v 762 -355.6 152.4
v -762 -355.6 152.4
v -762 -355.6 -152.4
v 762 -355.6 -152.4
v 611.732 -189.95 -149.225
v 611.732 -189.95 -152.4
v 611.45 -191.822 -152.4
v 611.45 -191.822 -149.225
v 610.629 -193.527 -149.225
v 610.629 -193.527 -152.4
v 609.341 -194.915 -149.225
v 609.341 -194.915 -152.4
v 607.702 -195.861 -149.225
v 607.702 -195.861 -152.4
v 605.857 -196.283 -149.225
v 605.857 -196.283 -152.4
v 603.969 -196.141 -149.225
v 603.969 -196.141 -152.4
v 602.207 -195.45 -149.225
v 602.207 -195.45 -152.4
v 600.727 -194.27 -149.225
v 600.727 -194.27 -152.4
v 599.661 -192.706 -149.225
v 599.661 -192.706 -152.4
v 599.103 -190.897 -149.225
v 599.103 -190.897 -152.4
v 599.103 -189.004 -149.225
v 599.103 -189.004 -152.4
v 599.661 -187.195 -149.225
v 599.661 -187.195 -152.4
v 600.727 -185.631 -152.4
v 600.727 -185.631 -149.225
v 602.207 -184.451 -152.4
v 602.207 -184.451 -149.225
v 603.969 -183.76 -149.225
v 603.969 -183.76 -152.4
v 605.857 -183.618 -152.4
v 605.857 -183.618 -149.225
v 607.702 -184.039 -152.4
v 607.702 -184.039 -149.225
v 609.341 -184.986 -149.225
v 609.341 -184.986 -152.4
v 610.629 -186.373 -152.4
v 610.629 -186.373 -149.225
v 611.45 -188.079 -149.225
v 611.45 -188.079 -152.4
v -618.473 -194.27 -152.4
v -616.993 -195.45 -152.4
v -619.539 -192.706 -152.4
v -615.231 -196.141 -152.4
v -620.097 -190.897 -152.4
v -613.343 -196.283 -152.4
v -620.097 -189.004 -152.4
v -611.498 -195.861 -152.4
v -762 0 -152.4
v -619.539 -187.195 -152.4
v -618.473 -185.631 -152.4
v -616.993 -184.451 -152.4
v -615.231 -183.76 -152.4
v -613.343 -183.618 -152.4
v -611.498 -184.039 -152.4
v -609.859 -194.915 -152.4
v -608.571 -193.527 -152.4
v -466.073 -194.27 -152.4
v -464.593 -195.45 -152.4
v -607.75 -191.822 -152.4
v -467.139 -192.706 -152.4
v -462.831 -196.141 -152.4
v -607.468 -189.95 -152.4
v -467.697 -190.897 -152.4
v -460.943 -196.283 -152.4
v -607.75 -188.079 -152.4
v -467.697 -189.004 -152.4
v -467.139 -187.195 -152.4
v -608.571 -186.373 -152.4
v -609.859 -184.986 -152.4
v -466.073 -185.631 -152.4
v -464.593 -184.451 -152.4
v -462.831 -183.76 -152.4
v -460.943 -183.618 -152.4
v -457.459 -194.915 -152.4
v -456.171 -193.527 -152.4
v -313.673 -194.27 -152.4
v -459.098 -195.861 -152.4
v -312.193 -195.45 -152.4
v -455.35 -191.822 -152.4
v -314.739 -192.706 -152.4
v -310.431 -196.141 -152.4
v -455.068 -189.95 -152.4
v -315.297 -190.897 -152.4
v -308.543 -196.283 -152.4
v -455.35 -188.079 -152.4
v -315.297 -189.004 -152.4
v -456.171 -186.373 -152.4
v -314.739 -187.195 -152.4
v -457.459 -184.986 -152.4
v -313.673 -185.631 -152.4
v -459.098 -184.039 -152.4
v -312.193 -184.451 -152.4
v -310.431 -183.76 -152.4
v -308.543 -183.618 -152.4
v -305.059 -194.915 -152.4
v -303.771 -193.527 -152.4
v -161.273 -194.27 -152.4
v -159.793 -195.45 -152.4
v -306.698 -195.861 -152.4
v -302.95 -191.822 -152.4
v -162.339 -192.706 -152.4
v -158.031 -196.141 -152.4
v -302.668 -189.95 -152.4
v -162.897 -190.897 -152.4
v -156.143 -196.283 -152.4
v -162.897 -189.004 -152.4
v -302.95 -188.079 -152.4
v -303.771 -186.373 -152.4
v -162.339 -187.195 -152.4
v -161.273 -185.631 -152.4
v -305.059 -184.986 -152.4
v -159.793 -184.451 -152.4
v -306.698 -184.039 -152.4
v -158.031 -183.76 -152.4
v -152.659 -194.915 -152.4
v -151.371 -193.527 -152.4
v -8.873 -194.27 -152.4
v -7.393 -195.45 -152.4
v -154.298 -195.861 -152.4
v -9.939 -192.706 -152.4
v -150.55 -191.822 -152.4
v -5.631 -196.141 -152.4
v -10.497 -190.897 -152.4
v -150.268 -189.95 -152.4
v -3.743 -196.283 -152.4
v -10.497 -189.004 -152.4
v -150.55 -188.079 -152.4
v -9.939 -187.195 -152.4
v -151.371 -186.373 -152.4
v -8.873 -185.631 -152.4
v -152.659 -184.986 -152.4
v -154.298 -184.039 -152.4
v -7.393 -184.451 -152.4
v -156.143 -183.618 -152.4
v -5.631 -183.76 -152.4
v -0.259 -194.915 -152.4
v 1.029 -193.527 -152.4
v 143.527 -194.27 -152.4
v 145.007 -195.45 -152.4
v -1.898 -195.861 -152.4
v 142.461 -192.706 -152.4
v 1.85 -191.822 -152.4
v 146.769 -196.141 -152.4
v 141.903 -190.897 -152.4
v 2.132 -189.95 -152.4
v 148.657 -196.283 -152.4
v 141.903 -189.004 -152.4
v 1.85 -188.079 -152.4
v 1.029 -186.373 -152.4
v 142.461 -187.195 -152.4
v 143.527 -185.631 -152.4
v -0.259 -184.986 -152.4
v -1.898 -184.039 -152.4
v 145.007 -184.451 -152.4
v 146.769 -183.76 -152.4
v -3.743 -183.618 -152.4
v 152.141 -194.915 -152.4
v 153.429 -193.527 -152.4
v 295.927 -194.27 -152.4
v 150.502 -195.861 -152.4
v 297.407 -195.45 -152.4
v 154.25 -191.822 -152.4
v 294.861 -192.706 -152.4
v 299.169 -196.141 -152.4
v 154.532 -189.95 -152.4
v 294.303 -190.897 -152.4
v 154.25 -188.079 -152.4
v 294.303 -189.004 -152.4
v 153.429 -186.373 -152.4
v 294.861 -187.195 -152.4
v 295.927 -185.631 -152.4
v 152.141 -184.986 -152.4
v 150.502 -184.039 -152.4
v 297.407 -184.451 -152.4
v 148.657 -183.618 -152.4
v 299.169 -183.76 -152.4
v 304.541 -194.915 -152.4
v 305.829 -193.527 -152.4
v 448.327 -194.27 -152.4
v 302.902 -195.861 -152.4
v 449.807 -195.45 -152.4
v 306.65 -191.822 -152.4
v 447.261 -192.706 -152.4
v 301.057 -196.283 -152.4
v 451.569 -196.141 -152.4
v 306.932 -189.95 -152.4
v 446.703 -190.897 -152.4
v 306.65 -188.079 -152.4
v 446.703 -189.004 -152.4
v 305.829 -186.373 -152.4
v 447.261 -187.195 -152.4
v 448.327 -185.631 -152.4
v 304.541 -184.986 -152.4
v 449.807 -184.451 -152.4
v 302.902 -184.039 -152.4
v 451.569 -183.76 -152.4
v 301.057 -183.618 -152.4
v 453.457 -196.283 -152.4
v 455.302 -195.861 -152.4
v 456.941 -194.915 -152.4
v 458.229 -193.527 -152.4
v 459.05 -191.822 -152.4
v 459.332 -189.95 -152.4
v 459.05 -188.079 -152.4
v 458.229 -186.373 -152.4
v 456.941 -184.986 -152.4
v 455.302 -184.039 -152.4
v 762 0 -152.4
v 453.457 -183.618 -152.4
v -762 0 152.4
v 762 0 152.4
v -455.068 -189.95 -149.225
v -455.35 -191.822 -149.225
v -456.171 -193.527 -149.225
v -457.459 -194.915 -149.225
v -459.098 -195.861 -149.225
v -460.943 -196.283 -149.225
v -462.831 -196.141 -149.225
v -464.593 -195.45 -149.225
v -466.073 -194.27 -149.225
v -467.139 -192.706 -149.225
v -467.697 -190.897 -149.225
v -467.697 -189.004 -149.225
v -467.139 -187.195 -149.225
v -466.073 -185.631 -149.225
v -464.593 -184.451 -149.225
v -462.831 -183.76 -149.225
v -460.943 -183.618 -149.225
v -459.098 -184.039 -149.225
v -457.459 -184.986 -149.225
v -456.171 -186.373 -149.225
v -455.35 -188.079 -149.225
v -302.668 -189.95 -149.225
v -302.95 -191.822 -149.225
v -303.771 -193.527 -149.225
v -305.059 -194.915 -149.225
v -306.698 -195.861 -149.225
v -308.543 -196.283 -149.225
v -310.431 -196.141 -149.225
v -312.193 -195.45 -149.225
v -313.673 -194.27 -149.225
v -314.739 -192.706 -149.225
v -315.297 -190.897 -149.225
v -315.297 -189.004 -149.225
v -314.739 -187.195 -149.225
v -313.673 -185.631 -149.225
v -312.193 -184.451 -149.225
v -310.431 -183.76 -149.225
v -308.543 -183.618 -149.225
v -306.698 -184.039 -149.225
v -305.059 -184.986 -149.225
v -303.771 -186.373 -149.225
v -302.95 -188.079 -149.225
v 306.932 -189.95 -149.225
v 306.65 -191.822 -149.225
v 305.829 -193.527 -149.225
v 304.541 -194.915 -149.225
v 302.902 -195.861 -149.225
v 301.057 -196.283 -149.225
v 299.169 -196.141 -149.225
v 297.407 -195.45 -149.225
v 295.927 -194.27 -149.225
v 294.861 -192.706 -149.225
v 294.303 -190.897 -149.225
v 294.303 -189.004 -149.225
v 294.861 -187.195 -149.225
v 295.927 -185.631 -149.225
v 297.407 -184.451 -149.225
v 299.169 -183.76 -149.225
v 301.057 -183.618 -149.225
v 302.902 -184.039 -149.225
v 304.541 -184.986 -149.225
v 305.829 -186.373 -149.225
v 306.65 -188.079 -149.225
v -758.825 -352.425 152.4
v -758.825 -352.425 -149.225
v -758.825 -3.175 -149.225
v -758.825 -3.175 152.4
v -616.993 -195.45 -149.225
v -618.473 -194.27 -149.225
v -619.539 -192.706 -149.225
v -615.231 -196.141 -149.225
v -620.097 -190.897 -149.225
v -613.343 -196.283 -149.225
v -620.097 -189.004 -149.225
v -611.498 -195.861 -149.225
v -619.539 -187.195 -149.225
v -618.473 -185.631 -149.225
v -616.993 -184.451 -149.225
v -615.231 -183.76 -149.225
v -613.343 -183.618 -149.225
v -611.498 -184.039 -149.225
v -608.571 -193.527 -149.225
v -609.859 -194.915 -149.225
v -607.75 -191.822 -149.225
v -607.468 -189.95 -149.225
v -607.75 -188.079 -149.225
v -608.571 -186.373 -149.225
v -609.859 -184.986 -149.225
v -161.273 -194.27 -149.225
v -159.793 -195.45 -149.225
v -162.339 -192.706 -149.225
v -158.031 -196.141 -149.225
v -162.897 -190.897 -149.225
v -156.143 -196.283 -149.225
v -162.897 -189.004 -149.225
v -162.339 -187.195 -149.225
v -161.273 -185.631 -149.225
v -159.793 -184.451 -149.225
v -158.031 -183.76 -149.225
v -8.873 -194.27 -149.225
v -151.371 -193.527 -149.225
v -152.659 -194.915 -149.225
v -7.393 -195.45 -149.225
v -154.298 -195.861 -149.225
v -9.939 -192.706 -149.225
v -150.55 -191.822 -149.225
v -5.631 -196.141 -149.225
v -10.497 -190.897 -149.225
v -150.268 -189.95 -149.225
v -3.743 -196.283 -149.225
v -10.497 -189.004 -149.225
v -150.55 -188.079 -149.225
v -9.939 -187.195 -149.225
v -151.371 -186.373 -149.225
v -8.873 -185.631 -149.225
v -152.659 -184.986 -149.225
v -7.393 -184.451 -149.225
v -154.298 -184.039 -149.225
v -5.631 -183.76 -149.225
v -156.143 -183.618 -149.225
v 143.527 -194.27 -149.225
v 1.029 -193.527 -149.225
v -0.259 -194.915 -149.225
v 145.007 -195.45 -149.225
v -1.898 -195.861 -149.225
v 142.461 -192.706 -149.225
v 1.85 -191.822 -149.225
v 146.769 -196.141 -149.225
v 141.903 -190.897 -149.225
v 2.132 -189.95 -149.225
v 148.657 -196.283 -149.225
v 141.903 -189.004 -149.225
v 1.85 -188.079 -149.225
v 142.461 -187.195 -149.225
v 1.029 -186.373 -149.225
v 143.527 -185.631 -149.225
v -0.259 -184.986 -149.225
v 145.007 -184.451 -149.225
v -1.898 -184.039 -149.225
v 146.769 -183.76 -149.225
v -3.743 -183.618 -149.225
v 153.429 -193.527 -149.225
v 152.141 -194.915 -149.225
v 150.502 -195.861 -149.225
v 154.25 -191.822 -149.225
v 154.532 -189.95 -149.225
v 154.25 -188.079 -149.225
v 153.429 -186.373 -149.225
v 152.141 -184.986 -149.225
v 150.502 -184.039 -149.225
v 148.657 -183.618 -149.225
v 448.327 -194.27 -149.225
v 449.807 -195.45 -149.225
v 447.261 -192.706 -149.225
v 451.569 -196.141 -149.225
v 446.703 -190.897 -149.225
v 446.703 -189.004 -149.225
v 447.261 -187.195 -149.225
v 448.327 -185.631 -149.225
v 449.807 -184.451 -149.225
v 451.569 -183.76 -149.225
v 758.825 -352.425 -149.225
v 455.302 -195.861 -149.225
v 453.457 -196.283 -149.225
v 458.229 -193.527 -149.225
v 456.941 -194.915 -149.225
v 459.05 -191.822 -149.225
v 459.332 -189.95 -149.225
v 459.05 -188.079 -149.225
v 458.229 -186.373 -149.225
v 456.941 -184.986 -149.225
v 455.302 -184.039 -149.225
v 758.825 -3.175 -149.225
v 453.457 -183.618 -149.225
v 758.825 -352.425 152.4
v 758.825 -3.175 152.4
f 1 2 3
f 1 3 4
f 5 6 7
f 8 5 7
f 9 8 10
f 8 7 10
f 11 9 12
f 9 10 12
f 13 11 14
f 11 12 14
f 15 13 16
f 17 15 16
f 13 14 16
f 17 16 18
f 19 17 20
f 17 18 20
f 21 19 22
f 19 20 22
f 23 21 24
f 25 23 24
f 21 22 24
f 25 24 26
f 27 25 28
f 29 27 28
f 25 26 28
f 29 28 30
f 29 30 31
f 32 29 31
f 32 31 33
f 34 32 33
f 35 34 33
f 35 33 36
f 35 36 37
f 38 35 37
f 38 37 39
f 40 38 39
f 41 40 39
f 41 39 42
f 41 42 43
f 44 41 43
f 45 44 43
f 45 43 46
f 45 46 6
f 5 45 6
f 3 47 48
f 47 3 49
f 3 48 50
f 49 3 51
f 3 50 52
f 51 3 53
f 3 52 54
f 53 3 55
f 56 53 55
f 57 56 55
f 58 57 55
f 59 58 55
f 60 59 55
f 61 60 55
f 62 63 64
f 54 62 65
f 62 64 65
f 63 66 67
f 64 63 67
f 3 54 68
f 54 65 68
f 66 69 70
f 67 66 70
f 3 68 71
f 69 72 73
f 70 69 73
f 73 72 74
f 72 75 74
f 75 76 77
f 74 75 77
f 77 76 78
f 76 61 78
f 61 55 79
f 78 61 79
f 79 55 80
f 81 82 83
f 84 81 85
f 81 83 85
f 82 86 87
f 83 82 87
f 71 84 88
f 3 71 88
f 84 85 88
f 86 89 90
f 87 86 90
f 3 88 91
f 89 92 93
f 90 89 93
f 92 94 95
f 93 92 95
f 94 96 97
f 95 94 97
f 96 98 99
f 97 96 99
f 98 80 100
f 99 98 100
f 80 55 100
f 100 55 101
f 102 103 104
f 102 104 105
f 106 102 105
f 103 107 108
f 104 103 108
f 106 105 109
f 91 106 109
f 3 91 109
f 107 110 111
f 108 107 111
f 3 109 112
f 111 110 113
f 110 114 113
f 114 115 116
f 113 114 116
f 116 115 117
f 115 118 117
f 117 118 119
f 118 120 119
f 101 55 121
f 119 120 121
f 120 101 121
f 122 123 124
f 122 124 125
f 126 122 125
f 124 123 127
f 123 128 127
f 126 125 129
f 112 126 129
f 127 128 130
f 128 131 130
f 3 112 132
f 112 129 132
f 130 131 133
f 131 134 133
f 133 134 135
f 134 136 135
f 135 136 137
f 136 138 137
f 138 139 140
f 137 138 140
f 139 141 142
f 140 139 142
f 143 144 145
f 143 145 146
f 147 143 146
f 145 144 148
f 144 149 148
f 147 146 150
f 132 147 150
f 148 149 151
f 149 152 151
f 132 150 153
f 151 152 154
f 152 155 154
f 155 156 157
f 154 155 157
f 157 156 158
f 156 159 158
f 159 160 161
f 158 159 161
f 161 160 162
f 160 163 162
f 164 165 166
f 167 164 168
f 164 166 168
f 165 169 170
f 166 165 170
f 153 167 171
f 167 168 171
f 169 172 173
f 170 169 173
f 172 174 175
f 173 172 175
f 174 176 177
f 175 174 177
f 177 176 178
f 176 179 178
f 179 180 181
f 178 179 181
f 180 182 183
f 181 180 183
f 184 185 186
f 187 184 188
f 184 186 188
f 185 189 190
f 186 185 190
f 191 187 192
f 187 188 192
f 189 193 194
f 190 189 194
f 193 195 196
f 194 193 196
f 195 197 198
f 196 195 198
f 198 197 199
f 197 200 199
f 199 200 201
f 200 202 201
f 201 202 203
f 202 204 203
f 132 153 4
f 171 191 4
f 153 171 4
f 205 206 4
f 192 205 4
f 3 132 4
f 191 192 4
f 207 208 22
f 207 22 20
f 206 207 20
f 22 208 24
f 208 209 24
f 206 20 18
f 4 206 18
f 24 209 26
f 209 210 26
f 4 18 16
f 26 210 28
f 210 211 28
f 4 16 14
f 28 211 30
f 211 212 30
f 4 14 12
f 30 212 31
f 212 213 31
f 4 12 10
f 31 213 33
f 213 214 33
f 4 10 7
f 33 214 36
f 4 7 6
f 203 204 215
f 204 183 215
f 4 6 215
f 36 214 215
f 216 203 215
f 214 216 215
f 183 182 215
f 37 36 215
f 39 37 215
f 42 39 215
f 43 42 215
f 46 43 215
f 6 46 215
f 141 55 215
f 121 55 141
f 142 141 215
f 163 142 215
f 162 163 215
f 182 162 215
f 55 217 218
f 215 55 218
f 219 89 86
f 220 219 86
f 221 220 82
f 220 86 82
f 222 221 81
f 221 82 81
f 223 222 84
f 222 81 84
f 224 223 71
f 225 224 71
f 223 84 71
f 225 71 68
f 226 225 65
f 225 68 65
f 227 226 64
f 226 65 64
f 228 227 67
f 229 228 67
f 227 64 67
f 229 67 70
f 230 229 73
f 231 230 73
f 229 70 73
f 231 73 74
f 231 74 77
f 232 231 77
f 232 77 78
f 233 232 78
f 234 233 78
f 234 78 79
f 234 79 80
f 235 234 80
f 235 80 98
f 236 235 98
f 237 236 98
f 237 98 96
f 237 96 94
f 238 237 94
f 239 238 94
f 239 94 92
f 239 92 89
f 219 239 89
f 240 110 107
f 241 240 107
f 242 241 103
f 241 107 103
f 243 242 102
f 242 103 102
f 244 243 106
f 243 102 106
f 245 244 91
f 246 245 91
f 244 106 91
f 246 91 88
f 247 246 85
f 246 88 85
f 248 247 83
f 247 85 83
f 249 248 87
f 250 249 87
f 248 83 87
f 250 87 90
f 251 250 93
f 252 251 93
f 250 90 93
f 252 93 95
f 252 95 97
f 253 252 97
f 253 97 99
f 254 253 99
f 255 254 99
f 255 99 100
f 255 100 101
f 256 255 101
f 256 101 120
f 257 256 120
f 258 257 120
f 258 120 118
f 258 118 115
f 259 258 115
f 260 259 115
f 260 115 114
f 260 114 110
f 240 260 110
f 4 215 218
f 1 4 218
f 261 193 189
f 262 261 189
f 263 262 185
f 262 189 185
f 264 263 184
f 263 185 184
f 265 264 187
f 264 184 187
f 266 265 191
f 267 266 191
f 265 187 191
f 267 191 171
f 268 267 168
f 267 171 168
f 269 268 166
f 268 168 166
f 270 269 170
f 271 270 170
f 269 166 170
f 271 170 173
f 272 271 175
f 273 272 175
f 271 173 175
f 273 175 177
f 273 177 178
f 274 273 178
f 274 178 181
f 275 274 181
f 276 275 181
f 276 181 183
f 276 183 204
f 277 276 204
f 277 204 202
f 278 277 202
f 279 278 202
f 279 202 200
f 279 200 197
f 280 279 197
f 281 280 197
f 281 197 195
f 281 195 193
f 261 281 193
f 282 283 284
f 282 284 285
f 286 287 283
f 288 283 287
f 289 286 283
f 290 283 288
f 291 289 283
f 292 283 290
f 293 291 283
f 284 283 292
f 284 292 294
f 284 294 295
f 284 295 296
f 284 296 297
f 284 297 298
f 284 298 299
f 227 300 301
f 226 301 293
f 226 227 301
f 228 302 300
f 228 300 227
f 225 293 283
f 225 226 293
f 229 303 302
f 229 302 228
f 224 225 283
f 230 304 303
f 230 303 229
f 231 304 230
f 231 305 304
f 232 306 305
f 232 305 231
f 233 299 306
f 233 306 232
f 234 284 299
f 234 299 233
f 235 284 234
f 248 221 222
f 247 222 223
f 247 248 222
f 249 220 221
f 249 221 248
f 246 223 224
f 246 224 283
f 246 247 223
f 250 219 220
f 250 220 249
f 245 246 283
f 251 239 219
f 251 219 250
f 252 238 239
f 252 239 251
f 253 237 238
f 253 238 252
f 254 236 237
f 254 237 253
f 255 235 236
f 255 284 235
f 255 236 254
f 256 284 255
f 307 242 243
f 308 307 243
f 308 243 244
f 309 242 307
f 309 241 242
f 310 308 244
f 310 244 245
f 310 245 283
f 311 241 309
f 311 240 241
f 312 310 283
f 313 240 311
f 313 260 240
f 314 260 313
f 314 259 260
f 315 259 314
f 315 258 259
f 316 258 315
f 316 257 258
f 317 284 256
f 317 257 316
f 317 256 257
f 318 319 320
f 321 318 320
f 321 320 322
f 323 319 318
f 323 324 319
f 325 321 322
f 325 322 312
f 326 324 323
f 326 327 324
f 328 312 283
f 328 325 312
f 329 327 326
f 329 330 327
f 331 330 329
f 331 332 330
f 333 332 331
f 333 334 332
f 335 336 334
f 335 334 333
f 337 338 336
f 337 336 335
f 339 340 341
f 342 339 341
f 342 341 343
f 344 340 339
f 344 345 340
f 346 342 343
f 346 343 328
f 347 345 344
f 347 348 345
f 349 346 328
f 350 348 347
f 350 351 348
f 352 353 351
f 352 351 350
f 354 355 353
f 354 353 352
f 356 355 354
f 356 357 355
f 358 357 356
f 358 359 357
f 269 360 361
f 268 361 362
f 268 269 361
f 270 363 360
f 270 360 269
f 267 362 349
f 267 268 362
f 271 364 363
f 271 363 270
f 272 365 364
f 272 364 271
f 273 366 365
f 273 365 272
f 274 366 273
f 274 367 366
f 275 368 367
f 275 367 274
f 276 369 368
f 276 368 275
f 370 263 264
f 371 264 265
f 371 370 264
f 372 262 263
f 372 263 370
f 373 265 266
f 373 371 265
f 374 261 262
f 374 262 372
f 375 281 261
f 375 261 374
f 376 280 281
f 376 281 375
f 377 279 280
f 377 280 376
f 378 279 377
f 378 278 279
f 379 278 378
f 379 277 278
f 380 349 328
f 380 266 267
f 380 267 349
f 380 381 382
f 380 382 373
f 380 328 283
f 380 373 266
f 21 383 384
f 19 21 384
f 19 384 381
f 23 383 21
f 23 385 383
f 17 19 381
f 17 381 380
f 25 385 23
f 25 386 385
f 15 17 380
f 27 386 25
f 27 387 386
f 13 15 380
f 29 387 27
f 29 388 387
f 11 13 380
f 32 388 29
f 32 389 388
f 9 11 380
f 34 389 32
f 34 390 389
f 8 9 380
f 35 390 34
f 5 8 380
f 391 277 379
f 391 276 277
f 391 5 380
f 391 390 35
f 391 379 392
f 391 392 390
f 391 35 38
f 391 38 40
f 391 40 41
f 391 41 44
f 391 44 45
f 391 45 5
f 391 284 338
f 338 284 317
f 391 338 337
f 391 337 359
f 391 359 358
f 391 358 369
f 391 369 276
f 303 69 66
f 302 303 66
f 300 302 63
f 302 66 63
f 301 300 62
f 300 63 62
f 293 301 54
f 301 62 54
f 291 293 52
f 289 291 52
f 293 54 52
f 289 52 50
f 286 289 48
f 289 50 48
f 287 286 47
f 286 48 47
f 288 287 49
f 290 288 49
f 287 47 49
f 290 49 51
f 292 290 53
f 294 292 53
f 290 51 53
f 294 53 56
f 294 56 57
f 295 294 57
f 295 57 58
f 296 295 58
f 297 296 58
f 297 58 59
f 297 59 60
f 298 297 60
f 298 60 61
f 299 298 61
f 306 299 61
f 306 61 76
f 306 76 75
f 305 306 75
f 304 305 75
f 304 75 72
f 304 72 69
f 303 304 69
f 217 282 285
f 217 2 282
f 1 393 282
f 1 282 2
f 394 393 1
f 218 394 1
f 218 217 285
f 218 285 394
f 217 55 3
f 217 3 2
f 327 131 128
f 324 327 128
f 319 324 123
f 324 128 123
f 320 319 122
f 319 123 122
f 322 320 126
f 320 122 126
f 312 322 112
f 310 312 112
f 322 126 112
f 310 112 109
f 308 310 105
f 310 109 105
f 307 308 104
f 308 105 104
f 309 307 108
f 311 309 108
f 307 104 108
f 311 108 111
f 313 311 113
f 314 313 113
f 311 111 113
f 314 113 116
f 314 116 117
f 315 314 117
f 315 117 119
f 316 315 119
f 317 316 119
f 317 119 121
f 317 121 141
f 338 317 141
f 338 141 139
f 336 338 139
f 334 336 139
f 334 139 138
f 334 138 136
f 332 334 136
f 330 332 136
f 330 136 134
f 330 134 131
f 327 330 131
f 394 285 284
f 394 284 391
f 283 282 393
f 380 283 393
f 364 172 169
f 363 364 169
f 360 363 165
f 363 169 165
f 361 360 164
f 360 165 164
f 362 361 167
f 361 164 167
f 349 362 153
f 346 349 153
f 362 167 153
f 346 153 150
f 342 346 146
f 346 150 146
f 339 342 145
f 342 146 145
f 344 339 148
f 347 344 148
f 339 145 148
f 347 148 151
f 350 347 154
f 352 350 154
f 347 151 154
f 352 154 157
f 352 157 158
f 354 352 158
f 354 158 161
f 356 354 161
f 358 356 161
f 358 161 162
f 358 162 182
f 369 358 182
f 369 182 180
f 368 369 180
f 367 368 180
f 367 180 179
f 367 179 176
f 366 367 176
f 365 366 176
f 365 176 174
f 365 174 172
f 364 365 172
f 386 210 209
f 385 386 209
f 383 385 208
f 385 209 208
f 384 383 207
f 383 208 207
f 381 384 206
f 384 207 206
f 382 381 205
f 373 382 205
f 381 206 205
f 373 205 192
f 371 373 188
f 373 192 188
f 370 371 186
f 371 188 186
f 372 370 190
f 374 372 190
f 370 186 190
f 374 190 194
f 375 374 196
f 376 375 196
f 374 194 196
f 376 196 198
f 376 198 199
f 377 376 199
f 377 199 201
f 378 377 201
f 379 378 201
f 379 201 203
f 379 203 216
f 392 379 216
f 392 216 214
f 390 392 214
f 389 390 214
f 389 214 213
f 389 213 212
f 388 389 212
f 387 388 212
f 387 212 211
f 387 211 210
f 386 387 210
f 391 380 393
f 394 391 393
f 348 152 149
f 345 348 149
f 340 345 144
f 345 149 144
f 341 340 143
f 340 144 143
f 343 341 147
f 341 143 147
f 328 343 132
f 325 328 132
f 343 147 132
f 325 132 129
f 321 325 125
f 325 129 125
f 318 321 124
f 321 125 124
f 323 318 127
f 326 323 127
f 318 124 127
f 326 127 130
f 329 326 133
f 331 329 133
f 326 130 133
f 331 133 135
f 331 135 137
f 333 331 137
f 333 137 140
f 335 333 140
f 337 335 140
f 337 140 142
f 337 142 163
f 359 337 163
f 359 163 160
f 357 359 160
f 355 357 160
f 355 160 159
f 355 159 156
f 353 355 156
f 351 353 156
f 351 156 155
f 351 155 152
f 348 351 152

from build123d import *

# Parameters (mm, degrees)
F0_W     = 1524
F0_H     = 304.8
F1_DEPTH = 355.6
F2_T     = -3.175
F3_R     = 6.35
F4_DEPTH = 25.4


with BuildPart() as f1:
    # F0 (on Front) → F1 (new body)
    with BuildSketch(Plane.XZ):
        Rectangle(F0_W, F0_H)
    extrude(amount=F1_DEPTH)

    # F2
    f2_openings = [f1.faces().sort_by_distance(p)[0] for p in [
        (0, -177.8, 152.4),
    ]]
    offset(amount=F2_T, openings=f2_openings)

    # F3 (on face) → F4 (cut)
    with BuildSketch(Plane(origin=(0, 0, -152.4), x_dir=(1, 0, 0), z_dir=(0, 0, -1))):
        with Locations((-613.817692, 189.950407)):
            Circle(F3_R)
        with Locations((-461.417692, 189.950407)):
            Circle(F3_R)
        with Locations((-309.017692, 189.950407)):
            Circle(F3_R)
        with Locations((-156.617692, 189.950407)):
            Circle(F3_R)
        with Locations((-4.217692, 189.950407)):
            Circle(F3_R)
        with Locations((148.182308, 189.950407)):
            Circle(F3_R)
        with Locations((300.582308, 189.950407)):
            Circle(F3_R)
        with Locations((452.982308, 189.950407)):
            Circle(F3_R)
        with Locations((605.382308, 189.950407)):
            Circle(F3_R)
    extrude(amount=-F4_DEPTH, mode=Mode.SUBTRACT)


solid = f1.part
